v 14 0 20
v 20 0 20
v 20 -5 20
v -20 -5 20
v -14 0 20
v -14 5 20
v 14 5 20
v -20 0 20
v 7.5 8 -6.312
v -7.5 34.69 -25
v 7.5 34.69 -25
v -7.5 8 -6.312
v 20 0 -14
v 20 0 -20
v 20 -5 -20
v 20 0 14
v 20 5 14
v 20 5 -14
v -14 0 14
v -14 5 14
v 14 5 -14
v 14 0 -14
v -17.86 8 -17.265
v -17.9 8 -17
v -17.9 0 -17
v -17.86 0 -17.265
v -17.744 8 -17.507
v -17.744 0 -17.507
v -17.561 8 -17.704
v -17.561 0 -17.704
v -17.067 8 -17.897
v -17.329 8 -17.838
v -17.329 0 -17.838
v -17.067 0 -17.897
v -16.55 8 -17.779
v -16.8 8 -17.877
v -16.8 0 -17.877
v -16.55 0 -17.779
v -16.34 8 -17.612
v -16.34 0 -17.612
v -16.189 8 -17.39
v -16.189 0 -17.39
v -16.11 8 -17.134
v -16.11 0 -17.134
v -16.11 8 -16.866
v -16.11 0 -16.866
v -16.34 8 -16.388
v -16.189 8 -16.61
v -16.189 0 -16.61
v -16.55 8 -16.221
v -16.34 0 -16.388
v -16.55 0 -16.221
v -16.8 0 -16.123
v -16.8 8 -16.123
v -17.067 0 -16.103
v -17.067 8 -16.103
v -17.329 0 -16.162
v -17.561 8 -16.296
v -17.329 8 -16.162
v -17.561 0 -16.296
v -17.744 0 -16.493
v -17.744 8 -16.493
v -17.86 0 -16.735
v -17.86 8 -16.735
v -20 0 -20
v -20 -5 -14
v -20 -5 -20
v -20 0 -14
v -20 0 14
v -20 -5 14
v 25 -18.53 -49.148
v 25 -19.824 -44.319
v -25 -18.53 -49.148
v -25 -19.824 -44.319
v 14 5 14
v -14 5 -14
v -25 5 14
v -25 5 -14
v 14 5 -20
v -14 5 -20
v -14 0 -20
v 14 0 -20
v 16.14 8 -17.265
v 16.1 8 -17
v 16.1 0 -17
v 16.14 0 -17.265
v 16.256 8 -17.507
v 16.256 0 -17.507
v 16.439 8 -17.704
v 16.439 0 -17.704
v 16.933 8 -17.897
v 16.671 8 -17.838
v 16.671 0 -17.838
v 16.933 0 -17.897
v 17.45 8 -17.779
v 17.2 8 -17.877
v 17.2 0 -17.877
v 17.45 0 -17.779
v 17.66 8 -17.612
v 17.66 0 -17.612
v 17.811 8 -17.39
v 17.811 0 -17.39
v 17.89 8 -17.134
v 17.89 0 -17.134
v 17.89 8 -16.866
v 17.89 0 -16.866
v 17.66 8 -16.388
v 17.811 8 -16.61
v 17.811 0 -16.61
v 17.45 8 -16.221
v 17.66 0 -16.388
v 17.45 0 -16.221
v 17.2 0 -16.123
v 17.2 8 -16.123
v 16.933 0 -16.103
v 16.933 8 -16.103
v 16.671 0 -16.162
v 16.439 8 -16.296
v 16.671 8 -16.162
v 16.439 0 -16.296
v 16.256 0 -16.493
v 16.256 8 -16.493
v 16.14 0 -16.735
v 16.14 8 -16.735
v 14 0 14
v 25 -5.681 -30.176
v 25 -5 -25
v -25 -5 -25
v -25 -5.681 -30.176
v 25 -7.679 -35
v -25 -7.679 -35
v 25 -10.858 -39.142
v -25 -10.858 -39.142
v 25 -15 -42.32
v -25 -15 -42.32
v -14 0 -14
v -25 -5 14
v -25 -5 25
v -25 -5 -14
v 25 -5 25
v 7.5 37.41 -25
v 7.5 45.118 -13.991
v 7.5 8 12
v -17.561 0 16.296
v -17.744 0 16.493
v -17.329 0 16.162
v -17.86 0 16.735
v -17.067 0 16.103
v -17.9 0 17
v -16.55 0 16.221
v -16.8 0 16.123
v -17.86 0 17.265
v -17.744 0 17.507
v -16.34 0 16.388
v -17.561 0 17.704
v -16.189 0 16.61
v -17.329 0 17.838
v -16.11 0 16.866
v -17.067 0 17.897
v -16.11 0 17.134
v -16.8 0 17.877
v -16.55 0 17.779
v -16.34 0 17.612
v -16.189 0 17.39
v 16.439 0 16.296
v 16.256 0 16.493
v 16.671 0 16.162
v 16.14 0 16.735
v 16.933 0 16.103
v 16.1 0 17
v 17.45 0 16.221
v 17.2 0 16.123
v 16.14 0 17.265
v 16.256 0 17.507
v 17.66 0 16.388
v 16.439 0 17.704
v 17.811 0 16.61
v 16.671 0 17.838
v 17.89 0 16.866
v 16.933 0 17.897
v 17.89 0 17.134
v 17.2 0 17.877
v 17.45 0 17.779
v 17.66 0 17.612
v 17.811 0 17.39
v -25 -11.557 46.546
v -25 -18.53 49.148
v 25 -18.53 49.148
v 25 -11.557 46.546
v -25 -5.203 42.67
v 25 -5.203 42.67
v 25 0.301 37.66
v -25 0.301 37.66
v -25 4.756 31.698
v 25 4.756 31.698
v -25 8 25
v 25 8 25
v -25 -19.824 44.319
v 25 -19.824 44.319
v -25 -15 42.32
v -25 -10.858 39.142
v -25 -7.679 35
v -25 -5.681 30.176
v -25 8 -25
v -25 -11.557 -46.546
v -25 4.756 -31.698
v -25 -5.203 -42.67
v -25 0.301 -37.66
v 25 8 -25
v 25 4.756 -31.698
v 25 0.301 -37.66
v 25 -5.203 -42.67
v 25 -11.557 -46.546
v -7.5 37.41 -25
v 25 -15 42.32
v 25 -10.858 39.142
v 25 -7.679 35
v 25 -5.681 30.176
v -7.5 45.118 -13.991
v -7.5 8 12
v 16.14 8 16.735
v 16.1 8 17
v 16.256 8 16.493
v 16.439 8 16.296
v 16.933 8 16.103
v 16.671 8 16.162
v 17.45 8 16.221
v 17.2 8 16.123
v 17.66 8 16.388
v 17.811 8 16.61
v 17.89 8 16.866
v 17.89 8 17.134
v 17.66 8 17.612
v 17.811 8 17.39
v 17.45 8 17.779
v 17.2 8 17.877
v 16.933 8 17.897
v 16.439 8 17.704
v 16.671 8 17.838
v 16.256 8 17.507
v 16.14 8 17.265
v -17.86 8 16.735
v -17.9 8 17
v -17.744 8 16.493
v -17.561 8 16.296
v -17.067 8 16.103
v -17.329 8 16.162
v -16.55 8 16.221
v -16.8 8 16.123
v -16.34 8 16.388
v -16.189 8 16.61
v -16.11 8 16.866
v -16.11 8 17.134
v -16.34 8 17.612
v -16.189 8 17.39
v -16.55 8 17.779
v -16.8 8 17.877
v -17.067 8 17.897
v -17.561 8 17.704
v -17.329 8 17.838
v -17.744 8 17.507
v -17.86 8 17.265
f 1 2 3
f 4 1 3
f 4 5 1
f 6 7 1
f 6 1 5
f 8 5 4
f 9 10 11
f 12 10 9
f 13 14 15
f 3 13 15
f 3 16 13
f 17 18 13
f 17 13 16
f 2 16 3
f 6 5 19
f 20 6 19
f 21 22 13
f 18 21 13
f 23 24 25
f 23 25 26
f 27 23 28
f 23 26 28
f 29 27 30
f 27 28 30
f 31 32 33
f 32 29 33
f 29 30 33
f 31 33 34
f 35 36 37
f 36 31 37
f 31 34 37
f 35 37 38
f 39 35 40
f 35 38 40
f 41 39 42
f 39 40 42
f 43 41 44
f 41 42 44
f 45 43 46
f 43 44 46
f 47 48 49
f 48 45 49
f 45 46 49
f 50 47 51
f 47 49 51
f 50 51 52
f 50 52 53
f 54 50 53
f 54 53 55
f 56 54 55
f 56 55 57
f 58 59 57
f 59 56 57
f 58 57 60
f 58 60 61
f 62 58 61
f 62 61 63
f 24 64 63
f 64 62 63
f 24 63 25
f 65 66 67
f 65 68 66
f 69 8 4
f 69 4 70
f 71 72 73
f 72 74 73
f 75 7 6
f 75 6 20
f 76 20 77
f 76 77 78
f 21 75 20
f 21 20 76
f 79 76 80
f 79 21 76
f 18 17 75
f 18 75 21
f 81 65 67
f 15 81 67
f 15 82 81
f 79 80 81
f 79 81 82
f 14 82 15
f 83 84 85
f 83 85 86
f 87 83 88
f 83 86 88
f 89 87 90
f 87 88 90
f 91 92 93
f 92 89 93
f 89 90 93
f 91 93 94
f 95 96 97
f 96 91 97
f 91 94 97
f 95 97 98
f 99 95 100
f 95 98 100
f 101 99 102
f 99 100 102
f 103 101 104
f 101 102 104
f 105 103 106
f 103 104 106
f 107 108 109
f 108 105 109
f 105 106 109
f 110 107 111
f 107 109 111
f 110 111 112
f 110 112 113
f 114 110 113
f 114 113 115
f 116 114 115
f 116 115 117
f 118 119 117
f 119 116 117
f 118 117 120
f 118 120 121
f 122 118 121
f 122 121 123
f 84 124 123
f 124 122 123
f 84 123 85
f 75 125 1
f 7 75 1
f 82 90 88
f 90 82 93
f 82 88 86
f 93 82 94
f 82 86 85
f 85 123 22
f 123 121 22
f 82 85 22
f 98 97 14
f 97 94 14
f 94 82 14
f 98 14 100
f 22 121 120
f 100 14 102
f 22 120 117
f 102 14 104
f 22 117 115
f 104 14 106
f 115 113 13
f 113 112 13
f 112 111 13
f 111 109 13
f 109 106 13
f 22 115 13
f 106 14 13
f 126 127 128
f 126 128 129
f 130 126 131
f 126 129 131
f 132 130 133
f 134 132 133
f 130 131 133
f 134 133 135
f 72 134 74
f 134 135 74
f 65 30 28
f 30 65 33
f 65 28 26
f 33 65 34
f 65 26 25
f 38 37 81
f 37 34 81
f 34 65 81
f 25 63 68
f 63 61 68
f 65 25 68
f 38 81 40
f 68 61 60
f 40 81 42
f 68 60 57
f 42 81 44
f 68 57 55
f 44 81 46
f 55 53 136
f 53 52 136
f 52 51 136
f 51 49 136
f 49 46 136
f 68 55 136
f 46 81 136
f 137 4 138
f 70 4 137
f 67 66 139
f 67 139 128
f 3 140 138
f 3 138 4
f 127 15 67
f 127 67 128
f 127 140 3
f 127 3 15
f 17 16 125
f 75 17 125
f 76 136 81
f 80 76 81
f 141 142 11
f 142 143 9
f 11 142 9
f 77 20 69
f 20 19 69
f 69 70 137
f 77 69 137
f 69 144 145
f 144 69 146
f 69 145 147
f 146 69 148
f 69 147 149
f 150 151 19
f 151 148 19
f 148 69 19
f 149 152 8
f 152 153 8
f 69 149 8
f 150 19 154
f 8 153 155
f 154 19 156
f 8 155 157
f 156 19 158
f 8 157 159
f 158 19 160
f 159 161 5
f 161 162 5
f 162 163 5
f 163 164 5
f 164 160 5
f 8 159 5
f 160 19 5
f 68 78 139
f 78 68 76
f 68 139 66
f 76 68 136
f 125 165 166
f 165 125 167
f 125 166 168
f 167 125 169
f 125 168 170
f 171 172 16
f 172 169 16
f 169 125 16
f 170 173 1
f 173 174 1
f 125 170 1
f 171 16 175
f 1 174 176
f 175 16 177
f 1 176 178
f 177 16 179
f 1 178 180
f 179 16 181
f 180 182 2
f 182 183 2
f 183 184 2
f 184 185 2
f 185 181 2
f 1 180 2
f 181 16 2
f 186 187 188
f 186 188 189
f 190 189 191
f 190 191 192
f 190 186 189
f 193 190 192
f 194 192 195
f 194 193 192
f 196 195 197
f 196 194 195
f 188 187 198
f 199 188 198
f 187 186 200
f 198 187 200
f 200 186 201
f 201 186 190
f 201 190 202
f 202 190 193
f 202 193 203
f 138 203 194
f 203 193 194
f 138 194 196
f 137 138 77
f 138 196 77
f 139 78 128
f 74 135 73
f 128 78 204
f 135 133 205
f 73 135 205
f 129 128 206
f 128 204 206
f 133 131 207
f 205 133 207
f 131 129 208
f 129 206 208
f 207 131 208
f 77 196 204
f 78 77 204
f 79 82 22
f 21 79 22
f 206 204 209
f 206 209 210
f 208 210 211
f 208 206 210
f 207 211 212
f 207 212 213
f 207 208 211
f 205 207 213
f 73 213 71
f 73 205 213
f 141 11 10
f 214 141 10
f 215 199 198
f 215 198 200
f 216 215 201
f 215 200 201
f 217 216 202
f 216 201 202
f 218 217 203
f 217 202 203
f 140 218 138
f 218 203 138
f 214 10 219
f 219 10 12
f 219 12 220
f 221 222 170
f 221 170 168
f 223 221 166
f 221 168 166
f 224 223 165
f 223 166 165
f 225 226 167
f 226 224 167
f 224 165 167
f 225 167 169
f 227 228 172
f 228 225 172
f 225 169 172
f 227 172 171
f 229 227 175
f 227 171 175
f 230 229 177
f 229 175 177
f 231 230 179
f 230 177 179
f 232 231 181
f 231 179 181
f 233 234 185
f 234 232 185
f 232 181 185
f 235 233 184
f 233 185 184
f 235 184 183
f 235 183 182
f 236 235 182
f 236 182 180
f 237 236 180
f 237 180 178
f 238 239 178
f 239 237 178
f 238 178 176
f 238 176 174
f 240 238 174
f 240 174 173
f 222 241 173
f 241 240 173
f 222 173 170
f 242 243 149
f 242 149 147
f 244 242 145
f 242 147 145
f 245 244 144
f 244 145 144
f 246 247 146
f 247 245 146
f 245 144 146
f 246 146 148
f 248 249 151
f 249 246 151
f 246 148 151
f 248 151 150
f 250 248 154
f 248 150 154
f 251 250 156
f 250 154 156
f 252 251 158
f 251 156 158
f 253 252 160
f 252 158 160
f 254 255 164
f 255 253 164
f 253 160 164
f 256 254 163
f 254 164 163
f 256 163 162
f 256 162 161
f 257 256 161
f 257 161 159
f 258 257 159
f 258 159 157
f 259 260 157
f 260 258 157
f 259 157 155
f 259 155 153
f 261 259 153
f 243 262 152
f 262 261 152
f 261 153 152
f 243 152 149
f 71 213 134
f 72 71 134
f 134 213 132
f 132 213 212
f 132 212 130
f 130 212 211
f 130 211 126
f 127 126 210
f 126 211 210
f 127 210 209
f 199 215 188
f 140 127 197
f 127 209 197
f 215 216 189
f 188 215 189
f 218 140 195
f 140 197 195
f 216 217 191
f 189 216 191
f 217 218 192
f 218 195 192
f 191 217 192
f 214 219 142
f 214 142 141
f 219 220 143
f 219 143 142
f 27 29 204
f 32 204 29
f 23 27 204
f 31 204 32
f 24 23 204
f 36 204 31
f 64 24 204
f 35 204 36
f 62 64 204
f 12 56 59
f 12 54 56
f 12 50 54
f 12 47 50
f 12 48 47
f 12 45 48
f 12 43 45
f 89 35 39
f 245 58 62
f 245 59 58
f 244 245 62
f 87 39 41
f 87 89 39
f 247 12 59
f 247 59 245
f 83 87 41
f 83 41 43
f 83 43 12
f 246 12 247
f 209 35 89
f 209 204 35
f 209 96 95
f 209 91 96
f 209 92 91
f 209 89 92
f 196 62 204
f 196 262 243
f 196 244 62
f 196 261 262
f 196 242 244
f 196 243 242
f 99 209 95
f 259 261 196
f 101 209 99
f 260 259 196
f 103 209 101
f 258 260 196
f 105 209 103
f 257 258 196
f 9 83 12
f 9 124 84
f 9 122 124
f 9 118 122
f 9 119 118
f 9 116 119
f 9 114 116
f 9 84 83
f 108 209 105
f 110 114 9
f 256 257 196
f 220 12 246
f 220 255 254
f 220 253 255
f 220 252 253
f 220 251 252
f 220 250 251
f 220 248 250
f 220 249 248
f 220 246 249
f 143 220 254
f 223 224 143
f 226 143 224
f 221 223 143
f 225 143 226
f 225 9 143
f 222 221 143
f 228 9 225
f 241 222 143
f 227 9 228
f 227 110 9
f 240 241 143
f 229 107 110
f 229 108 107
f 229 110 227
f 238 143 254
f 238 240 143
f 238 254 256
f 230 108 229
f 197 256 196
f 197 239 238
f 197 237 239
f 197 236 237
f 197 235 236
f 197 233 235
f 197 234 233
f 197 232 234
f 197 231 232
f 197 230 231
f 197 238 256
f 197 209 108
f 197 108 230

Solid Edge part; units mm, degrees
sketch "Sketch1" plane through (0, 0, 0) normal (0, -1, 0) x (1, 0, 0)
  line L0 (-20, -20) -> (20, -20)
  line L1 (20, -20) -> (20, 20)
  line L2 (20, 20) -> (-20, 20)
  line L3 (-20, 20) -> (-20, -20)
  line L4 (-25, -25) -> (25, -25)
  line L5 (25, -25) -> (25, 25)
  line L6 (25, 25) -> (-25, 25)
  line L7 (-25, 25) -> (-25, -25)
  dimension "D1" = 40
  dimension "D2" = 50
extrude "Protrusion1" add sketch "Sketch1" along normal blind 5
sketch "Sketch2" plane through (0, 0, 0) normal (0, 1, 0) x (-1, 0, 0)
  line L0 (-25, -25) -> (25, -25)
  line L1 (25, -25) -> (25, 25)
  line L2 (25, 25) -> (-25, 25)
  line L3 (-25, 25) -> (-25, -25)
  circle A0 centre (17, 17) radius 0.9
  circle A1 centre (-17, 17) radius 0.9
  circle A2 centre (-17, -17) radius 0.9
  circle A3 centre (17, -17) radius 0.9
extrude "Extrusionsausprägung_2" add sketch "Sketch2" along normal blind 8
sketch "Sketch3" plane through (-25, 1.5, 0) normal (-1, 0, 0) x (0, -1, 0)
  line L0 (6.5, 25) -> (-6.5, 25)
  arc A0 (20.0295, 49.1481) -> (-6.5, 25) centre (30.1482, 11.3846) ccw
  line L1 (20.0295, 49.1481) -> (21.3236, 44.3185)
  arc A1 (21.3236, 44.3185) -> (6.5, 25) centre (26.5, 25) ccw
  line L2 (6.5, -25) -> (-6.5, -25)
  arc A2 (-6.5, -25) -> (20.0295, -49.1481) centre (30.1482, -11.3846) ccw
  line L3 (21.3236, -44.3185) -> (20.0295, -49.1481)
  arc A3 (6.5, -25) -> (21.3236, -44.3185) centre (26.5, -25) ccw
  dimension "D1" = 5
  dimension "D2" = 5
  dimension "D3" = 20
  dimension "D4" = 20
extrude "Protrusion2" add sketch "Sketch3" against normal up to vertex (50 mm away)
sketch "Sketch4" plane through (0, -5, 0) normal (0, -1, 0) x (1, 0, 0)
  line L0 (-25, 14) -> (-25, -14)
  line L1 (-25, -14) -> (-14, -14)
  line L2 (-14, -14) -> (-14, -20)
  line L3 (-14, -20) -> (14, -20)
  line L4 (14, -20) -> (14, -14)
  line L5 (14, -14) -> (20, -14)
  line L6 (20, -14) -> (20, 14)
  line L7 (20, 14) -> (14, 14)
  line L8 (14, 14) -> (14, 20)
  line L9 (14, 20) -> (-14, 20)
  line L10 (-14, 20) -> (-14, 14)
  line L11 (-14, 14) -> (-25, 14)
  dimension "D1" = 6
extrude "Extrusionsausschnitt_1" cut sketch "Sketch4" against normal blind 10
sketch "Sketch5" plane through (0, 8, 0) normal (0, 1, 0) x (-1, 0, 0)
  line L0 (-7.5, -25) -> (7.5, -25)
  line L1 (7.5, -25) -> (7.5, 25)
  line L2 (7.5, 25) -> (-7.5, 25)
  line L3 (-7.5, 25) -> (-7.5, -25)
  dimension "D1" = 15
extrude "Extrusionsausprägung_6" add sketch "Sketch5" along normal blind 40
sketch "Sketch6" plane through (-7.5, 28, 0) normal (-1, 0, 0) x (0, -1, 0)
  line L0 (20, -6.3116) -> (20, -25)
  line L1 (-8.5148, -26.2779) -> (20, -6.3116)
  line L2 (-17.1184, -13.9906) -> (-8.5148, -26.2779)
  line L3 (20, 12) -> (-17.1184, -13.9906)
  line L4 (20, 25) -> (20, 12)
  line L5 (-20, 25) -> (20, 25)
  line L6 (-20, 25) -> (-40.7628, -3.883)
  line L7 (-40.7628, -3.883) -> (-20, -25)
  line L8 (-20, -25) -> (-14.3498, -34.4374)
  line L9 (-14.3498, -34.4374) -> (20, -25)
  dimension "D1" = 15
  dimension "D2" = 13
extrude "Cutout1" cut sketch "Sketch6" against normal through all
properties material "Nylon, allgemein"
